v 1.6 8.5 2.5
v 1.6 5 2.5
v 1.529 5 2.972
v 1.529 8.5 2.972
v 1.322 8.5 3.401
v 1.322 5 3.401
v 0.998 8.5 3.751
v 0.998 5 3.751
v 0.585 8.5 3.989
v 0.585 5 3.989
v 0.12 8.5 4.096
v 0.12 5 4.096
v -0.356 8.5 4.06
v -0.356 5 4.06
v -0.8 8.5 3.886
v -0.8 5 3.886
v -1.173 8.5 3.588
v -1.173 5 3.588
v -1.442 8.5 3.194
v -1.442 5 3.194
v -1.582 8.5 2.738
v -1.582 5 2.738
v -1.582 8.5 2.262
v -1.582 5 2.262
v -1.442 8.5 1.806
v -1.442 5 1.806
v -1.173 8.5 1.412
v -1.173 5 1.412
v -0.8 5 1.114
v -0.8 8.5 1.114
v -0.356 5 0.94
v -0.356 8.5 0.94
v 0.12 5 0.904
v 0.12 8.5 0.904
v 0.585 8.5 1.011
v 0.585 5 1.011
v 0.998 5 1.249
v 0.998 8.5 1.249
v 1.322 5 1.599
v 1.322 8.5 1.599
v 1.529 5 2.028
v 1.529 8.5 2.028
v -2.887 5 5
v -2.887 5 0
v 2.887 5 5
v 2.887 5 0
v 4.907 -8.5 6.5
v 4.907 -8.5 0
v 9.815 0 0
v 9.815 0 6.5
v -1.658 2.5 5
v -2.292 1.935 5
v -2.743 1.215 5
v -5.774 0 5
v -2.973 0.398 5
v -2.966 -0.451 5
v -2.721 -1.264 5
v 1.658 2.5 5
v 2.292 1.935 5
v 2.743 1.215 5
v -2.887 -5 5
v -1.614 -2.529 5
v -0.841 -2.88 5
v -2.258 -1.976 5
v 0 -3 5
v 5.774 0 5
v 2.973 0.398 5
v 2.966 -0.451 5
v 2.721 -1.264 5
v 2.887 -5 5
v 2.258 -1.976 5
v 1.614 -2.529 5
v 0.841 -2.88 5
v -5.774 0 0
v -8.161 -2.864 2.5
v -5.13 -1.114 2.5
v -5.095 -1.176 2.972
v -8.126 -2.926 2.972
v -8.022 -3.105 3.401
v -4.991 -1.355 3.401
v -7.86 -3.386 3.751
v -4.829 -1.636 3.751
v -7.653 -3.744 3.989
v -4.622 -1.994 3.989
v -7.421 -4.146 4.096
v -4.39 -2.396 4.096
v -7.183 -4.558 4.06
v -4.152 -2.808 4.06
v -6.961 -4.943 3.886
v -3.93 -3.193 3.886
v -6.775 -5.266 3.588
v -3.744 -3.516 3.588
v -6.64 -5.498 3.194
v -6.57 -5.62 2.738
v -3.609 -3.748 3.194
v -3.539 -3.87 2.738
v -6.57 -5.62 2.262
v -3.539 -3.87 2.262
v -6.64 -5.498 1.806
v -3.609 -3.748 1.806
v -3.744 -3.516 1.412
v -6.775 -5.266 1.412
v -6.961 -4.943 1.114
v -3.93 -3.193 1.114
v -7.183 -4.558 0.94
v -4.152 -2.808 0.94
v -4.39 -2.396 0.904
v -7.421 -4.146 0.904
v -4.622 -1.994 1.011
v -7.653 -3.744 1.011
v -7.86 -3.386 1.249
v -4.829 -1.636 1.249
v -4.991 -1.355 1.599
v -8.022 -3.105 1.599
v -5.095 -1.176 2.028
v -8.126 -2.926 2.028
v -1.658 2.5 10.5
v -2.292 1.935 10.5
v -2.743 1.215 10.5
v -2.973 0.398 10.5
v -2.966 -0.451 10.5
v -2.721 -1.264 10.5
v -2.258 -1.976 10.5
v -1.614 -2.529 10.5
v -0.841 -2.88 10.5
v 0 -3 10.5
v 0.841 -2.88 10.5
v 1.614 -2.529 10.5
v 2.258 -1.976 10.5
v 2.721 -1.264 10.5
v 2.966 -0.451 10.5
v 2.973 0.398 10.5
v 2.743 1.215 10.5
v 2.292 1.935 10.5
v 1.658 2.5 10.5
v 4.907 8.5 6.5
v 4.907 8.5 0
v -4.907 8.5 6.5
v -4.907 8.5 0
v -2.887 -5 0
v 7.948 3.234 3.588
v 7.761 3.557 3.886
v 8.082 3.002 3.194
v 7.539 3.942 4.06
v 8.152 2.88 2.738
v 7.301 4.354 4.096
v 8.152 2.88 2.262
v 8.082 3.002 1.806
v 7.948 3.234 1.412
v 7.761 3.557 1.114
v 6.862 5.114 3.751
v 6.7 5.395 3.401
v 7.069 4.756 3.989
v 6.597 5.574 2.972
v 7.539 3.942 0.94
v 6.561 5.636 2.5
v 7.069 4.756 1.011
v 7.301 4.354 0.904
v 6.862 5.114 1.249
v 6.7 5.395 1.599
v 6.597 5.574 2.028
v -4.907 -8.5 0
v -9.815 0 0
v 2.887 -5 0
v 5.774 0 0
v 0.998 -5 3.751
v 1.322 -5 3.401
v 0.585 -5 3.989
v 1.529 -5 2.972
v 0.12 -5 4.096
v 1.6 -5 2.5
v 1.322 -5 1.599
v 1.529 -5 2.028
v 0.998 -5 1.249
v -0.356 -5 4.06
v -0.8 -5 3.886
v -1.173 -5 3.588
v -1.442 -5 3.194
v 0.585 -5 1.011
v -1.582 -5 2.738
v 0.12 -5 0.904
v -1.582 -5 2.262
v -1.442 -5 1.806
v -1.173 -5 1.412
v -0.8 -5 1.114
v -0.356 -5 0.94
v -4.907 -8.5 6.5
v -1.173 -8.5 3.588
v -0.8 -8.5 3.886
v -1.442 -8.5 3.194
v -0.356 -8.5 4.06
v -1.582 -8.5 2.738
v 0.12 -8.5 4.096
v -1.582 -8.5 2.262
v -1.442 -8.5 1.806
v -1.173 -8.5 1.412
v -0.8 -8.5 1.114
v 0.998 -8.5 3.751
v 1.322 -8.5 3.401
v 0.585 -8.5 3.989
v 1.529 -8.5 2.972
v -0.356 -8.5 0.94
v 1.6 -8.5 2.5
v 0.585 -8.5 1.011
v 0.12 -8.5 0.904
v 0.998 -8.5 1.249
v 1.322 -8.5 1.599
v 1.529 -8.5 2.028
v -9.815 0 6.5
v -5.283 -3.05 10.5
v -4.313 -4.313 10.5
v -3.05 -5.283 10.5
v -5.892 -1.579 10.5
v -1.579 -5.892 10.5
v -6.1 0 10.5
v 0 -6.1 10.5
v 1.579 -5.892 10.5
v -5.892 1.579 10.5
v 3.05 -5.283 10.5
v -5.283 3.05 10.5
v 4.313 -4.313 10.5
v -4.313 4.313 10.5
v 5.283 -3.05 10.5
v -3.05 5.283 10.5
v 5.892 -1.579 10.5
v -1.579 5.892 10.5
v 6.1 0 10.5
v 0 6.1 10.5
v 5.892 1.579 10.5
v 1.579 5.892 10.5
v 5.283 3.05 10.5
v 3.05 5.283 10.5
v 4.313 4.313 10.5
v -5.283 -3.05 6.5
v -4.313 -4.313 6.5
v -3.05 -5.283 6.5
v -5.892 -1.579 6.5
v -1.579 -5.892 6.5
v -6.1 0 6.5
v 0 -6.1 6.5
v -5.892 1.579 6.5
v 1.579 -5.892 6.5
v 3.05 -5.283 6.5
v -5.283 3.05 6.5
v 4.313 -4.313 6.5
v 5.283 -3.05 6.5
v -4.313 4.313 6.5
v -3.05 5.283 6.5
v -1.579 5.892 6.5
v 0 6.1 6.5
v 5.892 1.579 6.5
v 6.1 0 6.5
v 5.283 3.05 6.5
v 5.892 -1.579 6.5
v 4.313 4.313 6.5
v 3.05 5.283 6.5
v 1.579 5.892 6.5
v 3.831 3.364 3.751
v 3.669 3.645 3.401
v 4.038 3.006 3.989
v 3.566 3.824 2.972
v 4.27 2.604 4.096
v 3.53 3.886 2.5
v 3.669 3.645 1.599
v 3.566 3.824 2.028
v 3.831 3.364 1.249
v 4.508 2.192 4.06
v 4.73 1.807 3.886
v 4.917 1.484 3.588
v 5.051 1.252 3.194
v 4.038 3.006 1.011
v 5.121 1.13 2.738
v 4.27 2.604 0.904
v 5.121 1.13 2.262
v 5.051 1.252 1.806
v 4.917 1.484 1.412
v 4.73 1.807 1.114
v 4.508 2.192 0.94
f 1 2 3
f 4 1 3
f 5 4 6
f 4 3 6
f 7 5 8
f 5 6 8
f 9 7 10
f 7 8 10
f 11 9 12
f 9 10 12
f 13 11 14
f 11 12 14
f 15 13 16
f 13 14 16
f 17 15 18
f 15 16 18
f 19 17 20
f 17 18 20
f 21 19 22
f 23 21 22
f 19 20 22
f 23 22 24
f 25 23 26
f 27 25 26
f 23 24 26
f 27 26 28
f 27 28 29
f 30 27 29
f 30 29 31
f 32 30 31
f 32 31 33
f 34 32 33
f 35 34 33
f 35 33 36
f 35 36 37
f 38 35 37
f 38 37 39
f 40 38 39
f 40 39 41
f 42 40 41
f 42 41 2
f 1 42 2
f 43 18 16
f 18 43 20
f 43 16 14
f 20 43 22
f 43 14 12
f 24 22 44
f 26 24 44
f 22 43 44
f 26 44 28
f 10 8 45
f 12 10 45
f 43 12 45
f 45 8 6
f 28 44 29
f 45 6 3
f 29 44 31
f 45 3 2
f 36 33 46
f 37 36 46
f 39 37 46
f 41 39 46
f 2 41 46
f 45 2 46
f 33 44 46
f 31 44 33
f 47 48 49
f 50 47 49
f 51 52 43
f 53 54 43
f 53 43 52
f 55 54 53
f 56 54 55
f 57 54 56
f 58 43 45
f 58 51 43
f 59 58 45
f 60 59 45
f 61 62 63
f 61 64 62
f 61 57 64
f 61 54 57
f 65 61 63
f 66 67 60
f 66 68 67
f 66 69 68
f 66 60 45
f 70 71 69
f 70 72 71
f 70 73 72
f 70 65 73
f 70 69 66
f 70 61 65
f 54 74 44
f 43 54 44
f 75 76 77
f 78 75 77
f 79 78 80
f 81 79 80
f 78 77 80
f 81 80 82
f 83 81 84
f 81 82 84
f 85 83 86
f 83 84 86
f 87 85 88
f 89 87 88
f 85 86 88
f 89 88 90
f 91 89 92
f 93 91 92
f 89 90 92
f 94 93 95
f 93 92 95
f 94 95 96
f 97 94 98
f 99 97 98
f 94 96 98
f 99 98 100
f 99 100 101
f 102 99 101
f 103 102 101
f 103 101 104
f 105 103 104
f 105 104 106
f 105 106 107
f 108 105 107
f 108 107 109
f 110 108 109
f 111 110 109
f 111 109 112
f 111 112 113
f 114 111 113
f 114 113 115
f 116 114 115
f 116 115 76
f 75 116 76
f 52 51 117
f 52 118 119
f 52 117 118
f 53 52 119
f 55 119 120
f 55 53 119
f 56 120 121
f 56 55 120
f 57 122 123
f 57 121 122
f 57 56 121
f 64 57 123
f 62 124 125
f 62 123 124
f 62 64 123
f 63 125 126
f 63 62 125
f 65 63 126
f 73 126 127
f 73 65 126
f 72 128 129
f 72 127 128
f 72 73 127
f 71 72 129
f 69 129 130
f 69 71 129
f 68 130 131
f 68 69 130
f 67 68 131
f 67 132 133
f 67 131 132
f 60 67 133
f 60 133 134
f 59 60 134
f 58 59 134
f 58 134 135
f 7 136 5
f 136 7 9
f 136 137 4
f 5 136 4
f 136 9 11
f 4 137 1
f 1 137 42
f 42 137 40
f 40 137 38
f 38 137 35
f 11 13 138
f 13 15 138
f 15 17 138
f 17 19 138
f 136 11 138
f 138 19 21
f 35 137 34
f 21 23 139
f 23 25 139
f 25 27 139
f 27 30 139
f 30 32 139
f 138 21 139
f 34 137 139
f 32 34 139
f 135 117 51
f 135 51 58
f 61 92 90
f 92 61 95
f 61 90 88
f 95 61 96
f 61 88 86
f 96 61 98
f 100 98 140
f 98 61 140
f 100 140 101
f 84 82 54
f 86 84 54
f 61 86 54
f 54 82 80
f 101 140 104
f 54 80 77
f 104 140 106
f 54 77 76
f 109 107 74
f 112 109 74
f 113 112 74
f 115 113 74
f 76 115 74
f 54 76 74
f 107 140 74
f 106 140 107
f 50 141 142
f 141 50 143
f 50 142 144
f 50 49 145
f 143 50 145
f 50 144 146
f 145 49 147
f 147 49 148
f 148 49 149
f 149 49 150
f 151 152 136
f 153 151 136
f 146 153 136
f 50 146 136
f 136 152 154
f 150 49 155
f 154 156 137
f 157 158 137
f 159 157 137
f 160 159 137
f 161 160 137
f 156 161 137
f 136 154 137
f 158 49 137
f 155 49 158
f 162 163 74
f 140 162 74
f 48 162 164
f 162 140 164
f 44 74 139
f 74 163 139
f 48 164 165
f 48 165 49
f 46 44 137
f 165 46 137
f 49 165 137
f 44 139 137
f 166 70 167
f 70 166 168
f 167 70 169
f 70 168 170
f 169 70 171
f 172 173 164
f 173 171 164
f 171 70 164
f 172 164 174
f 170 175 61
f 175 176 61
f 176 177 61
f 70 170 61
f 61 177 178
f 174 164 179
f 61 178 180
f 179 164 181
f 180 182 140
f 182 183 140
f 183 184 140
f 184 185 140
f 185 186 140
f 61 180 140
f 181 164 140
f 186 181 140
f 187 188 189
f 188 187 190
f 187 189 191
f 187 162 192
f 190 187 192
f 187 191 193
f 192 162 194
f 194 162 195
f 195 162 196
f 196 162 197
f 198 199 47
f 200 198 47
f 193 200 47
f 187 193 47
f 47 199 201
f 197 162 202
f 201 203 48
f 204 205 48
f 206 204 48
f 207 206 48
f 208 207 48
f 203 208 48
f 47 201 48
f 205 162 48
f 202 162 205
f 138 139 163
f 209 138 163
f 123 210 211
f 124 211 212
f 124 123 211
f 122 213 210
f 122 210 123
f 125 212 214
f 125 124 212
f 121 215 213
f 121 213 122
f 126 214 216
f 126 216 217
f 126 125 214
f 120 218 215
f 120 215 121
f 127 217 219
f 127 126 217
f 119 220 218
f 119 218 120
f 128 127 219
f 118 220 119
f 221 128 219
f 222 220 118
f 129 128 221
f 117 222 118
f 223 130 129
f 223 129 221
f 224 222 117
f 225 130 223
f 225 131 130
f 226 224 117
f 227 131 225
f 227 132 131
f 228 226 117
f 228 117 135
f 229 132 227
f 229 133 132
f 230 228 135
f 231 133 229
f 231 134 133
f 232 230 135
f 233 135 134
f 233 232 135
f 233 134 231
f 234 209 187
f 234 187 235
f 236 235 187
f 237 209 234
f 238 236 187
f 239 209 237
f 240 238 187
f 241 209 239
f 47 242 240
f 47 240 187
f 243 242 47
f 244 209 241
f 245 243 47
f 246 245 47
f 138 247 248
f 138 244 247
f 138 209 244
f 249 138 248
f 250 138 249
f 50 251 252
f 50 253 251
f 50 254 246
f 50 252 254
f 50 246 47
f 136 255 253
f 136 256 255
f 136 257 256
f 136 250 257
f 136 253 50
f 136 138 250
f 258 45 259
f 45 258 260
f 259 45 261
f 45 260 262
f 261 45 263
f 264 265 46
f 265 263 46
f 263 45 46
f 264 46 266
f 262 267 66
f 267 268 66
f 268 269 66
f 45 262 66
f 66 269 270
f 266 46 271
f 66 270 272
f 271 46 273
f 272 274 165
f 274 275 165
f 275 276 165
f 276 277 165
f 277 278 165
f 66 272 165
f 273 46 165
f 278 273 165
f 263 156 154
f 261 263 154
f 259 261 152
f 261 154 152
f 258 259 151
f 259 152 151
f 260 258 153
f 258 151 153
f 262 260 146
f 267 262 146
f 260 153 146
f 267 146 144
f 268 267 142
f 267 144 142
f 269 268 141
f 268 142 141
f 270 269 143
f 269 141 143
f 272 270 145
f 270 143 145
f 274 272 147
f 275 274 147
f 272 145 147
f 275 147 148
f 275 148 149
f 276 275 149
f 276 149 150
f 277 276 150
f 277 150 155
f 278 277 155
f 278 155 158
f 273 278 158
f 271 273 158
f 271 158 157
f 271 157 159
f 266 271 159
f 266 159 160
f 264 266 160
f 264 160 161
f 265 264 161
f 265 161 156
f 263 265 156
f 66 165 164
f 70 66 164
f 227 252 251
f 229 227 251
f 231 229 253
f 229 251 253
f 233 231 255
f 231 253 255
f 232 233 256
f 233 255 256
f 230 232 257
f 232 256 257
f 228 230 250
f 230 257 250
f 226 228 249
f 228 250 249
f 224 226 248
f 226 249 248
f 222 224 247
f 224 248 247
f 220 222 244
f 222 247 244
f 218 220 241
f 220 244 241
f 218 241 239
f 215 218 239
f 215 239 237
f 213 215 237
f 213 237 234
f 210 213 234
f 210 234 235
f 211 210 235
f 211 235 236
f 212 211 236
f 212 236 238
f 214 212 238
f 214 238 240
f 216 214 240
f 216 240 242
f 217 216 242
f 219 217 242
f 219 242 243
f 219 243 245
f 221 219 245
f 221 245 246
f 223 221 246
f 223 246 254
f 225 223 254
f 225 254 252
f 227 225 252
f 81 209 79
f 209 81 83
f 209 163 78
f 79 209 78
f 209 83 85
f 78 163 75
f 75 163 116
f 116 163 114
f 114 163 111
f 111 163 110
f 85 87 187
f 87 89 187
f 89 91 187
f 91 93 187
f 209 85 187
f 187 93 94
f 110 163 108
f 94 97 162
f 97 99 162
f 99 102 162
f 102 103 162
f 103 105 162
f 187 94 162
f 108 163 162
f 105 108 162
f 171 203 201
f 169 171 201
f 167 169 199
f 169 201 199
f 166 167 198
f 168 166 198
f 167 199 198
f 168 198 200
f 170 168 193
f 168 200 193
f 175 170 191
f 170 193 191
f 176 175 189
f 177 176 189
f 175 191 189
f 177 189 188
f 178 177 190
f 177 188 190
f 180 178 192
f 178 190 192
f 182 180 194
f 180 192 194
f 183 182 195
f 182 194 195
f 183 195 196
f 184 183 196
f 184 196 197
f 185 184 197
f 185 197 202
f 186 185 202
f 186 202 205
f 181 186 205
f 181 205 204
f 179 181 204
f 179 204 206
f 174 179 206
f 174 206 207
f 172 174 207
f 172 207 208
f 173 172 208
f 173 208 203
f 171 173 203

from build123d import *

# Parameters (mm, degrees)
SKETCH_R        = 3
PAD_DEPTH       = 6.5
SKETCH001_R     = 6.1
SKETCH001_R_2   = 3
PAD001_DEPTH    = 10
PAD002_DEPTH    = 13
SKETCH003_R     = 6.1
POCKET_DEPTH    = 6
POCKET001_DEPTH = 5
SKETCH005_R     = 1.6
POCKET002_DEPTH = 17.001
SKETCH006_R     = 1.6
POCKET003_DEPTH = 21.251


with BuildPart() as part:
    # Sketch → Pad (new body)
    with BuildSketch(Plane.XY):
        Polygon((9.814955, 0), (4.907477, 8.5), (-4.907477, 8.5), (-9.814955, 0), (-4.907477, -8.5), (4.907477, -8.5), align=None)
        Circle(SKETCH_R, mode=Mode.SUBTRACT)
    extrude(amount=PAD_DEPTH)

    # Sketch001 (on Face9 of Pad) → Pad001 (join)
    with BuildSketch(Plane.XY.offset(6.5)):
        Circle(SKETCH001_R)
        Circle(SKETCH001_R_2, mode=Mode.SUBTRACT)
    extrude(amount=PAD001_DEPTH)

    # Sketch002 (on Face12 of Pad001) → Pad002 (join)
    with BuildSketch(Plane.XY.offset(16.5)):
        with BuildLine():
            Line((-1.658312, 2.5), (1.658312, 2.5))
            ThreePointArc((1.658312, 2.5), (0, 3), (-1.658312, 2.5))
        make_face()
    extrude(amount=-PAD002_DEPTH)

    # Sketch003 (on Face15 of Pad002) → Pocket (cut)
    with BuildSketch(Plane.XY.offset(16.5)):
        Circle(SKETCH003_R)
    extrude(amount=-POCKET_DEPTH, mode=Mode.SUBTRACT)

    # Sketch004 (on Face4 of Pocket) → Pocket001 (cut)
    with BuildSketch(Plane(origin=(0, 0, 0), x_dir=(1, 0, 0), z_dir=(0, 0, -1))):
        Polygon((2.886751, 5), (-2.886751, 5), (-5.773503, 0), (-2.886751, -5), (2.886751, -5), (5.773503, 0), align=None)
    extrude(amount=-POCKET001_DEPTH, mode=Mode.SUBTRACT)

    # Sketch005 (on Face6 of Pocket001) → Pocket002 (cut, through all)
    with BuildSketch(Plane.XZ.offset(8.5)):
        with Locations((0, 2.5)):
            Circle(SKETCH005_R)
    extrude(amount=-POCKET002_DEPTH, mode=Mode.SUBTRACT)

    # Sketch006 → Pocket003 (cut, through all)
    with BuildSketch(Plane(origin=(7.361216, 4.25, 0), x_dir=(-0.5, 0.866025, 0), z_dir=(0.866025, 0.5, 0))):
        with Locations((0, 2.5)):
            Circle(SKETCH006_R)
    extrude(amount=-POCKET003_DEPTH, mode=Mode.SUBTRACT)


solid = part.part
